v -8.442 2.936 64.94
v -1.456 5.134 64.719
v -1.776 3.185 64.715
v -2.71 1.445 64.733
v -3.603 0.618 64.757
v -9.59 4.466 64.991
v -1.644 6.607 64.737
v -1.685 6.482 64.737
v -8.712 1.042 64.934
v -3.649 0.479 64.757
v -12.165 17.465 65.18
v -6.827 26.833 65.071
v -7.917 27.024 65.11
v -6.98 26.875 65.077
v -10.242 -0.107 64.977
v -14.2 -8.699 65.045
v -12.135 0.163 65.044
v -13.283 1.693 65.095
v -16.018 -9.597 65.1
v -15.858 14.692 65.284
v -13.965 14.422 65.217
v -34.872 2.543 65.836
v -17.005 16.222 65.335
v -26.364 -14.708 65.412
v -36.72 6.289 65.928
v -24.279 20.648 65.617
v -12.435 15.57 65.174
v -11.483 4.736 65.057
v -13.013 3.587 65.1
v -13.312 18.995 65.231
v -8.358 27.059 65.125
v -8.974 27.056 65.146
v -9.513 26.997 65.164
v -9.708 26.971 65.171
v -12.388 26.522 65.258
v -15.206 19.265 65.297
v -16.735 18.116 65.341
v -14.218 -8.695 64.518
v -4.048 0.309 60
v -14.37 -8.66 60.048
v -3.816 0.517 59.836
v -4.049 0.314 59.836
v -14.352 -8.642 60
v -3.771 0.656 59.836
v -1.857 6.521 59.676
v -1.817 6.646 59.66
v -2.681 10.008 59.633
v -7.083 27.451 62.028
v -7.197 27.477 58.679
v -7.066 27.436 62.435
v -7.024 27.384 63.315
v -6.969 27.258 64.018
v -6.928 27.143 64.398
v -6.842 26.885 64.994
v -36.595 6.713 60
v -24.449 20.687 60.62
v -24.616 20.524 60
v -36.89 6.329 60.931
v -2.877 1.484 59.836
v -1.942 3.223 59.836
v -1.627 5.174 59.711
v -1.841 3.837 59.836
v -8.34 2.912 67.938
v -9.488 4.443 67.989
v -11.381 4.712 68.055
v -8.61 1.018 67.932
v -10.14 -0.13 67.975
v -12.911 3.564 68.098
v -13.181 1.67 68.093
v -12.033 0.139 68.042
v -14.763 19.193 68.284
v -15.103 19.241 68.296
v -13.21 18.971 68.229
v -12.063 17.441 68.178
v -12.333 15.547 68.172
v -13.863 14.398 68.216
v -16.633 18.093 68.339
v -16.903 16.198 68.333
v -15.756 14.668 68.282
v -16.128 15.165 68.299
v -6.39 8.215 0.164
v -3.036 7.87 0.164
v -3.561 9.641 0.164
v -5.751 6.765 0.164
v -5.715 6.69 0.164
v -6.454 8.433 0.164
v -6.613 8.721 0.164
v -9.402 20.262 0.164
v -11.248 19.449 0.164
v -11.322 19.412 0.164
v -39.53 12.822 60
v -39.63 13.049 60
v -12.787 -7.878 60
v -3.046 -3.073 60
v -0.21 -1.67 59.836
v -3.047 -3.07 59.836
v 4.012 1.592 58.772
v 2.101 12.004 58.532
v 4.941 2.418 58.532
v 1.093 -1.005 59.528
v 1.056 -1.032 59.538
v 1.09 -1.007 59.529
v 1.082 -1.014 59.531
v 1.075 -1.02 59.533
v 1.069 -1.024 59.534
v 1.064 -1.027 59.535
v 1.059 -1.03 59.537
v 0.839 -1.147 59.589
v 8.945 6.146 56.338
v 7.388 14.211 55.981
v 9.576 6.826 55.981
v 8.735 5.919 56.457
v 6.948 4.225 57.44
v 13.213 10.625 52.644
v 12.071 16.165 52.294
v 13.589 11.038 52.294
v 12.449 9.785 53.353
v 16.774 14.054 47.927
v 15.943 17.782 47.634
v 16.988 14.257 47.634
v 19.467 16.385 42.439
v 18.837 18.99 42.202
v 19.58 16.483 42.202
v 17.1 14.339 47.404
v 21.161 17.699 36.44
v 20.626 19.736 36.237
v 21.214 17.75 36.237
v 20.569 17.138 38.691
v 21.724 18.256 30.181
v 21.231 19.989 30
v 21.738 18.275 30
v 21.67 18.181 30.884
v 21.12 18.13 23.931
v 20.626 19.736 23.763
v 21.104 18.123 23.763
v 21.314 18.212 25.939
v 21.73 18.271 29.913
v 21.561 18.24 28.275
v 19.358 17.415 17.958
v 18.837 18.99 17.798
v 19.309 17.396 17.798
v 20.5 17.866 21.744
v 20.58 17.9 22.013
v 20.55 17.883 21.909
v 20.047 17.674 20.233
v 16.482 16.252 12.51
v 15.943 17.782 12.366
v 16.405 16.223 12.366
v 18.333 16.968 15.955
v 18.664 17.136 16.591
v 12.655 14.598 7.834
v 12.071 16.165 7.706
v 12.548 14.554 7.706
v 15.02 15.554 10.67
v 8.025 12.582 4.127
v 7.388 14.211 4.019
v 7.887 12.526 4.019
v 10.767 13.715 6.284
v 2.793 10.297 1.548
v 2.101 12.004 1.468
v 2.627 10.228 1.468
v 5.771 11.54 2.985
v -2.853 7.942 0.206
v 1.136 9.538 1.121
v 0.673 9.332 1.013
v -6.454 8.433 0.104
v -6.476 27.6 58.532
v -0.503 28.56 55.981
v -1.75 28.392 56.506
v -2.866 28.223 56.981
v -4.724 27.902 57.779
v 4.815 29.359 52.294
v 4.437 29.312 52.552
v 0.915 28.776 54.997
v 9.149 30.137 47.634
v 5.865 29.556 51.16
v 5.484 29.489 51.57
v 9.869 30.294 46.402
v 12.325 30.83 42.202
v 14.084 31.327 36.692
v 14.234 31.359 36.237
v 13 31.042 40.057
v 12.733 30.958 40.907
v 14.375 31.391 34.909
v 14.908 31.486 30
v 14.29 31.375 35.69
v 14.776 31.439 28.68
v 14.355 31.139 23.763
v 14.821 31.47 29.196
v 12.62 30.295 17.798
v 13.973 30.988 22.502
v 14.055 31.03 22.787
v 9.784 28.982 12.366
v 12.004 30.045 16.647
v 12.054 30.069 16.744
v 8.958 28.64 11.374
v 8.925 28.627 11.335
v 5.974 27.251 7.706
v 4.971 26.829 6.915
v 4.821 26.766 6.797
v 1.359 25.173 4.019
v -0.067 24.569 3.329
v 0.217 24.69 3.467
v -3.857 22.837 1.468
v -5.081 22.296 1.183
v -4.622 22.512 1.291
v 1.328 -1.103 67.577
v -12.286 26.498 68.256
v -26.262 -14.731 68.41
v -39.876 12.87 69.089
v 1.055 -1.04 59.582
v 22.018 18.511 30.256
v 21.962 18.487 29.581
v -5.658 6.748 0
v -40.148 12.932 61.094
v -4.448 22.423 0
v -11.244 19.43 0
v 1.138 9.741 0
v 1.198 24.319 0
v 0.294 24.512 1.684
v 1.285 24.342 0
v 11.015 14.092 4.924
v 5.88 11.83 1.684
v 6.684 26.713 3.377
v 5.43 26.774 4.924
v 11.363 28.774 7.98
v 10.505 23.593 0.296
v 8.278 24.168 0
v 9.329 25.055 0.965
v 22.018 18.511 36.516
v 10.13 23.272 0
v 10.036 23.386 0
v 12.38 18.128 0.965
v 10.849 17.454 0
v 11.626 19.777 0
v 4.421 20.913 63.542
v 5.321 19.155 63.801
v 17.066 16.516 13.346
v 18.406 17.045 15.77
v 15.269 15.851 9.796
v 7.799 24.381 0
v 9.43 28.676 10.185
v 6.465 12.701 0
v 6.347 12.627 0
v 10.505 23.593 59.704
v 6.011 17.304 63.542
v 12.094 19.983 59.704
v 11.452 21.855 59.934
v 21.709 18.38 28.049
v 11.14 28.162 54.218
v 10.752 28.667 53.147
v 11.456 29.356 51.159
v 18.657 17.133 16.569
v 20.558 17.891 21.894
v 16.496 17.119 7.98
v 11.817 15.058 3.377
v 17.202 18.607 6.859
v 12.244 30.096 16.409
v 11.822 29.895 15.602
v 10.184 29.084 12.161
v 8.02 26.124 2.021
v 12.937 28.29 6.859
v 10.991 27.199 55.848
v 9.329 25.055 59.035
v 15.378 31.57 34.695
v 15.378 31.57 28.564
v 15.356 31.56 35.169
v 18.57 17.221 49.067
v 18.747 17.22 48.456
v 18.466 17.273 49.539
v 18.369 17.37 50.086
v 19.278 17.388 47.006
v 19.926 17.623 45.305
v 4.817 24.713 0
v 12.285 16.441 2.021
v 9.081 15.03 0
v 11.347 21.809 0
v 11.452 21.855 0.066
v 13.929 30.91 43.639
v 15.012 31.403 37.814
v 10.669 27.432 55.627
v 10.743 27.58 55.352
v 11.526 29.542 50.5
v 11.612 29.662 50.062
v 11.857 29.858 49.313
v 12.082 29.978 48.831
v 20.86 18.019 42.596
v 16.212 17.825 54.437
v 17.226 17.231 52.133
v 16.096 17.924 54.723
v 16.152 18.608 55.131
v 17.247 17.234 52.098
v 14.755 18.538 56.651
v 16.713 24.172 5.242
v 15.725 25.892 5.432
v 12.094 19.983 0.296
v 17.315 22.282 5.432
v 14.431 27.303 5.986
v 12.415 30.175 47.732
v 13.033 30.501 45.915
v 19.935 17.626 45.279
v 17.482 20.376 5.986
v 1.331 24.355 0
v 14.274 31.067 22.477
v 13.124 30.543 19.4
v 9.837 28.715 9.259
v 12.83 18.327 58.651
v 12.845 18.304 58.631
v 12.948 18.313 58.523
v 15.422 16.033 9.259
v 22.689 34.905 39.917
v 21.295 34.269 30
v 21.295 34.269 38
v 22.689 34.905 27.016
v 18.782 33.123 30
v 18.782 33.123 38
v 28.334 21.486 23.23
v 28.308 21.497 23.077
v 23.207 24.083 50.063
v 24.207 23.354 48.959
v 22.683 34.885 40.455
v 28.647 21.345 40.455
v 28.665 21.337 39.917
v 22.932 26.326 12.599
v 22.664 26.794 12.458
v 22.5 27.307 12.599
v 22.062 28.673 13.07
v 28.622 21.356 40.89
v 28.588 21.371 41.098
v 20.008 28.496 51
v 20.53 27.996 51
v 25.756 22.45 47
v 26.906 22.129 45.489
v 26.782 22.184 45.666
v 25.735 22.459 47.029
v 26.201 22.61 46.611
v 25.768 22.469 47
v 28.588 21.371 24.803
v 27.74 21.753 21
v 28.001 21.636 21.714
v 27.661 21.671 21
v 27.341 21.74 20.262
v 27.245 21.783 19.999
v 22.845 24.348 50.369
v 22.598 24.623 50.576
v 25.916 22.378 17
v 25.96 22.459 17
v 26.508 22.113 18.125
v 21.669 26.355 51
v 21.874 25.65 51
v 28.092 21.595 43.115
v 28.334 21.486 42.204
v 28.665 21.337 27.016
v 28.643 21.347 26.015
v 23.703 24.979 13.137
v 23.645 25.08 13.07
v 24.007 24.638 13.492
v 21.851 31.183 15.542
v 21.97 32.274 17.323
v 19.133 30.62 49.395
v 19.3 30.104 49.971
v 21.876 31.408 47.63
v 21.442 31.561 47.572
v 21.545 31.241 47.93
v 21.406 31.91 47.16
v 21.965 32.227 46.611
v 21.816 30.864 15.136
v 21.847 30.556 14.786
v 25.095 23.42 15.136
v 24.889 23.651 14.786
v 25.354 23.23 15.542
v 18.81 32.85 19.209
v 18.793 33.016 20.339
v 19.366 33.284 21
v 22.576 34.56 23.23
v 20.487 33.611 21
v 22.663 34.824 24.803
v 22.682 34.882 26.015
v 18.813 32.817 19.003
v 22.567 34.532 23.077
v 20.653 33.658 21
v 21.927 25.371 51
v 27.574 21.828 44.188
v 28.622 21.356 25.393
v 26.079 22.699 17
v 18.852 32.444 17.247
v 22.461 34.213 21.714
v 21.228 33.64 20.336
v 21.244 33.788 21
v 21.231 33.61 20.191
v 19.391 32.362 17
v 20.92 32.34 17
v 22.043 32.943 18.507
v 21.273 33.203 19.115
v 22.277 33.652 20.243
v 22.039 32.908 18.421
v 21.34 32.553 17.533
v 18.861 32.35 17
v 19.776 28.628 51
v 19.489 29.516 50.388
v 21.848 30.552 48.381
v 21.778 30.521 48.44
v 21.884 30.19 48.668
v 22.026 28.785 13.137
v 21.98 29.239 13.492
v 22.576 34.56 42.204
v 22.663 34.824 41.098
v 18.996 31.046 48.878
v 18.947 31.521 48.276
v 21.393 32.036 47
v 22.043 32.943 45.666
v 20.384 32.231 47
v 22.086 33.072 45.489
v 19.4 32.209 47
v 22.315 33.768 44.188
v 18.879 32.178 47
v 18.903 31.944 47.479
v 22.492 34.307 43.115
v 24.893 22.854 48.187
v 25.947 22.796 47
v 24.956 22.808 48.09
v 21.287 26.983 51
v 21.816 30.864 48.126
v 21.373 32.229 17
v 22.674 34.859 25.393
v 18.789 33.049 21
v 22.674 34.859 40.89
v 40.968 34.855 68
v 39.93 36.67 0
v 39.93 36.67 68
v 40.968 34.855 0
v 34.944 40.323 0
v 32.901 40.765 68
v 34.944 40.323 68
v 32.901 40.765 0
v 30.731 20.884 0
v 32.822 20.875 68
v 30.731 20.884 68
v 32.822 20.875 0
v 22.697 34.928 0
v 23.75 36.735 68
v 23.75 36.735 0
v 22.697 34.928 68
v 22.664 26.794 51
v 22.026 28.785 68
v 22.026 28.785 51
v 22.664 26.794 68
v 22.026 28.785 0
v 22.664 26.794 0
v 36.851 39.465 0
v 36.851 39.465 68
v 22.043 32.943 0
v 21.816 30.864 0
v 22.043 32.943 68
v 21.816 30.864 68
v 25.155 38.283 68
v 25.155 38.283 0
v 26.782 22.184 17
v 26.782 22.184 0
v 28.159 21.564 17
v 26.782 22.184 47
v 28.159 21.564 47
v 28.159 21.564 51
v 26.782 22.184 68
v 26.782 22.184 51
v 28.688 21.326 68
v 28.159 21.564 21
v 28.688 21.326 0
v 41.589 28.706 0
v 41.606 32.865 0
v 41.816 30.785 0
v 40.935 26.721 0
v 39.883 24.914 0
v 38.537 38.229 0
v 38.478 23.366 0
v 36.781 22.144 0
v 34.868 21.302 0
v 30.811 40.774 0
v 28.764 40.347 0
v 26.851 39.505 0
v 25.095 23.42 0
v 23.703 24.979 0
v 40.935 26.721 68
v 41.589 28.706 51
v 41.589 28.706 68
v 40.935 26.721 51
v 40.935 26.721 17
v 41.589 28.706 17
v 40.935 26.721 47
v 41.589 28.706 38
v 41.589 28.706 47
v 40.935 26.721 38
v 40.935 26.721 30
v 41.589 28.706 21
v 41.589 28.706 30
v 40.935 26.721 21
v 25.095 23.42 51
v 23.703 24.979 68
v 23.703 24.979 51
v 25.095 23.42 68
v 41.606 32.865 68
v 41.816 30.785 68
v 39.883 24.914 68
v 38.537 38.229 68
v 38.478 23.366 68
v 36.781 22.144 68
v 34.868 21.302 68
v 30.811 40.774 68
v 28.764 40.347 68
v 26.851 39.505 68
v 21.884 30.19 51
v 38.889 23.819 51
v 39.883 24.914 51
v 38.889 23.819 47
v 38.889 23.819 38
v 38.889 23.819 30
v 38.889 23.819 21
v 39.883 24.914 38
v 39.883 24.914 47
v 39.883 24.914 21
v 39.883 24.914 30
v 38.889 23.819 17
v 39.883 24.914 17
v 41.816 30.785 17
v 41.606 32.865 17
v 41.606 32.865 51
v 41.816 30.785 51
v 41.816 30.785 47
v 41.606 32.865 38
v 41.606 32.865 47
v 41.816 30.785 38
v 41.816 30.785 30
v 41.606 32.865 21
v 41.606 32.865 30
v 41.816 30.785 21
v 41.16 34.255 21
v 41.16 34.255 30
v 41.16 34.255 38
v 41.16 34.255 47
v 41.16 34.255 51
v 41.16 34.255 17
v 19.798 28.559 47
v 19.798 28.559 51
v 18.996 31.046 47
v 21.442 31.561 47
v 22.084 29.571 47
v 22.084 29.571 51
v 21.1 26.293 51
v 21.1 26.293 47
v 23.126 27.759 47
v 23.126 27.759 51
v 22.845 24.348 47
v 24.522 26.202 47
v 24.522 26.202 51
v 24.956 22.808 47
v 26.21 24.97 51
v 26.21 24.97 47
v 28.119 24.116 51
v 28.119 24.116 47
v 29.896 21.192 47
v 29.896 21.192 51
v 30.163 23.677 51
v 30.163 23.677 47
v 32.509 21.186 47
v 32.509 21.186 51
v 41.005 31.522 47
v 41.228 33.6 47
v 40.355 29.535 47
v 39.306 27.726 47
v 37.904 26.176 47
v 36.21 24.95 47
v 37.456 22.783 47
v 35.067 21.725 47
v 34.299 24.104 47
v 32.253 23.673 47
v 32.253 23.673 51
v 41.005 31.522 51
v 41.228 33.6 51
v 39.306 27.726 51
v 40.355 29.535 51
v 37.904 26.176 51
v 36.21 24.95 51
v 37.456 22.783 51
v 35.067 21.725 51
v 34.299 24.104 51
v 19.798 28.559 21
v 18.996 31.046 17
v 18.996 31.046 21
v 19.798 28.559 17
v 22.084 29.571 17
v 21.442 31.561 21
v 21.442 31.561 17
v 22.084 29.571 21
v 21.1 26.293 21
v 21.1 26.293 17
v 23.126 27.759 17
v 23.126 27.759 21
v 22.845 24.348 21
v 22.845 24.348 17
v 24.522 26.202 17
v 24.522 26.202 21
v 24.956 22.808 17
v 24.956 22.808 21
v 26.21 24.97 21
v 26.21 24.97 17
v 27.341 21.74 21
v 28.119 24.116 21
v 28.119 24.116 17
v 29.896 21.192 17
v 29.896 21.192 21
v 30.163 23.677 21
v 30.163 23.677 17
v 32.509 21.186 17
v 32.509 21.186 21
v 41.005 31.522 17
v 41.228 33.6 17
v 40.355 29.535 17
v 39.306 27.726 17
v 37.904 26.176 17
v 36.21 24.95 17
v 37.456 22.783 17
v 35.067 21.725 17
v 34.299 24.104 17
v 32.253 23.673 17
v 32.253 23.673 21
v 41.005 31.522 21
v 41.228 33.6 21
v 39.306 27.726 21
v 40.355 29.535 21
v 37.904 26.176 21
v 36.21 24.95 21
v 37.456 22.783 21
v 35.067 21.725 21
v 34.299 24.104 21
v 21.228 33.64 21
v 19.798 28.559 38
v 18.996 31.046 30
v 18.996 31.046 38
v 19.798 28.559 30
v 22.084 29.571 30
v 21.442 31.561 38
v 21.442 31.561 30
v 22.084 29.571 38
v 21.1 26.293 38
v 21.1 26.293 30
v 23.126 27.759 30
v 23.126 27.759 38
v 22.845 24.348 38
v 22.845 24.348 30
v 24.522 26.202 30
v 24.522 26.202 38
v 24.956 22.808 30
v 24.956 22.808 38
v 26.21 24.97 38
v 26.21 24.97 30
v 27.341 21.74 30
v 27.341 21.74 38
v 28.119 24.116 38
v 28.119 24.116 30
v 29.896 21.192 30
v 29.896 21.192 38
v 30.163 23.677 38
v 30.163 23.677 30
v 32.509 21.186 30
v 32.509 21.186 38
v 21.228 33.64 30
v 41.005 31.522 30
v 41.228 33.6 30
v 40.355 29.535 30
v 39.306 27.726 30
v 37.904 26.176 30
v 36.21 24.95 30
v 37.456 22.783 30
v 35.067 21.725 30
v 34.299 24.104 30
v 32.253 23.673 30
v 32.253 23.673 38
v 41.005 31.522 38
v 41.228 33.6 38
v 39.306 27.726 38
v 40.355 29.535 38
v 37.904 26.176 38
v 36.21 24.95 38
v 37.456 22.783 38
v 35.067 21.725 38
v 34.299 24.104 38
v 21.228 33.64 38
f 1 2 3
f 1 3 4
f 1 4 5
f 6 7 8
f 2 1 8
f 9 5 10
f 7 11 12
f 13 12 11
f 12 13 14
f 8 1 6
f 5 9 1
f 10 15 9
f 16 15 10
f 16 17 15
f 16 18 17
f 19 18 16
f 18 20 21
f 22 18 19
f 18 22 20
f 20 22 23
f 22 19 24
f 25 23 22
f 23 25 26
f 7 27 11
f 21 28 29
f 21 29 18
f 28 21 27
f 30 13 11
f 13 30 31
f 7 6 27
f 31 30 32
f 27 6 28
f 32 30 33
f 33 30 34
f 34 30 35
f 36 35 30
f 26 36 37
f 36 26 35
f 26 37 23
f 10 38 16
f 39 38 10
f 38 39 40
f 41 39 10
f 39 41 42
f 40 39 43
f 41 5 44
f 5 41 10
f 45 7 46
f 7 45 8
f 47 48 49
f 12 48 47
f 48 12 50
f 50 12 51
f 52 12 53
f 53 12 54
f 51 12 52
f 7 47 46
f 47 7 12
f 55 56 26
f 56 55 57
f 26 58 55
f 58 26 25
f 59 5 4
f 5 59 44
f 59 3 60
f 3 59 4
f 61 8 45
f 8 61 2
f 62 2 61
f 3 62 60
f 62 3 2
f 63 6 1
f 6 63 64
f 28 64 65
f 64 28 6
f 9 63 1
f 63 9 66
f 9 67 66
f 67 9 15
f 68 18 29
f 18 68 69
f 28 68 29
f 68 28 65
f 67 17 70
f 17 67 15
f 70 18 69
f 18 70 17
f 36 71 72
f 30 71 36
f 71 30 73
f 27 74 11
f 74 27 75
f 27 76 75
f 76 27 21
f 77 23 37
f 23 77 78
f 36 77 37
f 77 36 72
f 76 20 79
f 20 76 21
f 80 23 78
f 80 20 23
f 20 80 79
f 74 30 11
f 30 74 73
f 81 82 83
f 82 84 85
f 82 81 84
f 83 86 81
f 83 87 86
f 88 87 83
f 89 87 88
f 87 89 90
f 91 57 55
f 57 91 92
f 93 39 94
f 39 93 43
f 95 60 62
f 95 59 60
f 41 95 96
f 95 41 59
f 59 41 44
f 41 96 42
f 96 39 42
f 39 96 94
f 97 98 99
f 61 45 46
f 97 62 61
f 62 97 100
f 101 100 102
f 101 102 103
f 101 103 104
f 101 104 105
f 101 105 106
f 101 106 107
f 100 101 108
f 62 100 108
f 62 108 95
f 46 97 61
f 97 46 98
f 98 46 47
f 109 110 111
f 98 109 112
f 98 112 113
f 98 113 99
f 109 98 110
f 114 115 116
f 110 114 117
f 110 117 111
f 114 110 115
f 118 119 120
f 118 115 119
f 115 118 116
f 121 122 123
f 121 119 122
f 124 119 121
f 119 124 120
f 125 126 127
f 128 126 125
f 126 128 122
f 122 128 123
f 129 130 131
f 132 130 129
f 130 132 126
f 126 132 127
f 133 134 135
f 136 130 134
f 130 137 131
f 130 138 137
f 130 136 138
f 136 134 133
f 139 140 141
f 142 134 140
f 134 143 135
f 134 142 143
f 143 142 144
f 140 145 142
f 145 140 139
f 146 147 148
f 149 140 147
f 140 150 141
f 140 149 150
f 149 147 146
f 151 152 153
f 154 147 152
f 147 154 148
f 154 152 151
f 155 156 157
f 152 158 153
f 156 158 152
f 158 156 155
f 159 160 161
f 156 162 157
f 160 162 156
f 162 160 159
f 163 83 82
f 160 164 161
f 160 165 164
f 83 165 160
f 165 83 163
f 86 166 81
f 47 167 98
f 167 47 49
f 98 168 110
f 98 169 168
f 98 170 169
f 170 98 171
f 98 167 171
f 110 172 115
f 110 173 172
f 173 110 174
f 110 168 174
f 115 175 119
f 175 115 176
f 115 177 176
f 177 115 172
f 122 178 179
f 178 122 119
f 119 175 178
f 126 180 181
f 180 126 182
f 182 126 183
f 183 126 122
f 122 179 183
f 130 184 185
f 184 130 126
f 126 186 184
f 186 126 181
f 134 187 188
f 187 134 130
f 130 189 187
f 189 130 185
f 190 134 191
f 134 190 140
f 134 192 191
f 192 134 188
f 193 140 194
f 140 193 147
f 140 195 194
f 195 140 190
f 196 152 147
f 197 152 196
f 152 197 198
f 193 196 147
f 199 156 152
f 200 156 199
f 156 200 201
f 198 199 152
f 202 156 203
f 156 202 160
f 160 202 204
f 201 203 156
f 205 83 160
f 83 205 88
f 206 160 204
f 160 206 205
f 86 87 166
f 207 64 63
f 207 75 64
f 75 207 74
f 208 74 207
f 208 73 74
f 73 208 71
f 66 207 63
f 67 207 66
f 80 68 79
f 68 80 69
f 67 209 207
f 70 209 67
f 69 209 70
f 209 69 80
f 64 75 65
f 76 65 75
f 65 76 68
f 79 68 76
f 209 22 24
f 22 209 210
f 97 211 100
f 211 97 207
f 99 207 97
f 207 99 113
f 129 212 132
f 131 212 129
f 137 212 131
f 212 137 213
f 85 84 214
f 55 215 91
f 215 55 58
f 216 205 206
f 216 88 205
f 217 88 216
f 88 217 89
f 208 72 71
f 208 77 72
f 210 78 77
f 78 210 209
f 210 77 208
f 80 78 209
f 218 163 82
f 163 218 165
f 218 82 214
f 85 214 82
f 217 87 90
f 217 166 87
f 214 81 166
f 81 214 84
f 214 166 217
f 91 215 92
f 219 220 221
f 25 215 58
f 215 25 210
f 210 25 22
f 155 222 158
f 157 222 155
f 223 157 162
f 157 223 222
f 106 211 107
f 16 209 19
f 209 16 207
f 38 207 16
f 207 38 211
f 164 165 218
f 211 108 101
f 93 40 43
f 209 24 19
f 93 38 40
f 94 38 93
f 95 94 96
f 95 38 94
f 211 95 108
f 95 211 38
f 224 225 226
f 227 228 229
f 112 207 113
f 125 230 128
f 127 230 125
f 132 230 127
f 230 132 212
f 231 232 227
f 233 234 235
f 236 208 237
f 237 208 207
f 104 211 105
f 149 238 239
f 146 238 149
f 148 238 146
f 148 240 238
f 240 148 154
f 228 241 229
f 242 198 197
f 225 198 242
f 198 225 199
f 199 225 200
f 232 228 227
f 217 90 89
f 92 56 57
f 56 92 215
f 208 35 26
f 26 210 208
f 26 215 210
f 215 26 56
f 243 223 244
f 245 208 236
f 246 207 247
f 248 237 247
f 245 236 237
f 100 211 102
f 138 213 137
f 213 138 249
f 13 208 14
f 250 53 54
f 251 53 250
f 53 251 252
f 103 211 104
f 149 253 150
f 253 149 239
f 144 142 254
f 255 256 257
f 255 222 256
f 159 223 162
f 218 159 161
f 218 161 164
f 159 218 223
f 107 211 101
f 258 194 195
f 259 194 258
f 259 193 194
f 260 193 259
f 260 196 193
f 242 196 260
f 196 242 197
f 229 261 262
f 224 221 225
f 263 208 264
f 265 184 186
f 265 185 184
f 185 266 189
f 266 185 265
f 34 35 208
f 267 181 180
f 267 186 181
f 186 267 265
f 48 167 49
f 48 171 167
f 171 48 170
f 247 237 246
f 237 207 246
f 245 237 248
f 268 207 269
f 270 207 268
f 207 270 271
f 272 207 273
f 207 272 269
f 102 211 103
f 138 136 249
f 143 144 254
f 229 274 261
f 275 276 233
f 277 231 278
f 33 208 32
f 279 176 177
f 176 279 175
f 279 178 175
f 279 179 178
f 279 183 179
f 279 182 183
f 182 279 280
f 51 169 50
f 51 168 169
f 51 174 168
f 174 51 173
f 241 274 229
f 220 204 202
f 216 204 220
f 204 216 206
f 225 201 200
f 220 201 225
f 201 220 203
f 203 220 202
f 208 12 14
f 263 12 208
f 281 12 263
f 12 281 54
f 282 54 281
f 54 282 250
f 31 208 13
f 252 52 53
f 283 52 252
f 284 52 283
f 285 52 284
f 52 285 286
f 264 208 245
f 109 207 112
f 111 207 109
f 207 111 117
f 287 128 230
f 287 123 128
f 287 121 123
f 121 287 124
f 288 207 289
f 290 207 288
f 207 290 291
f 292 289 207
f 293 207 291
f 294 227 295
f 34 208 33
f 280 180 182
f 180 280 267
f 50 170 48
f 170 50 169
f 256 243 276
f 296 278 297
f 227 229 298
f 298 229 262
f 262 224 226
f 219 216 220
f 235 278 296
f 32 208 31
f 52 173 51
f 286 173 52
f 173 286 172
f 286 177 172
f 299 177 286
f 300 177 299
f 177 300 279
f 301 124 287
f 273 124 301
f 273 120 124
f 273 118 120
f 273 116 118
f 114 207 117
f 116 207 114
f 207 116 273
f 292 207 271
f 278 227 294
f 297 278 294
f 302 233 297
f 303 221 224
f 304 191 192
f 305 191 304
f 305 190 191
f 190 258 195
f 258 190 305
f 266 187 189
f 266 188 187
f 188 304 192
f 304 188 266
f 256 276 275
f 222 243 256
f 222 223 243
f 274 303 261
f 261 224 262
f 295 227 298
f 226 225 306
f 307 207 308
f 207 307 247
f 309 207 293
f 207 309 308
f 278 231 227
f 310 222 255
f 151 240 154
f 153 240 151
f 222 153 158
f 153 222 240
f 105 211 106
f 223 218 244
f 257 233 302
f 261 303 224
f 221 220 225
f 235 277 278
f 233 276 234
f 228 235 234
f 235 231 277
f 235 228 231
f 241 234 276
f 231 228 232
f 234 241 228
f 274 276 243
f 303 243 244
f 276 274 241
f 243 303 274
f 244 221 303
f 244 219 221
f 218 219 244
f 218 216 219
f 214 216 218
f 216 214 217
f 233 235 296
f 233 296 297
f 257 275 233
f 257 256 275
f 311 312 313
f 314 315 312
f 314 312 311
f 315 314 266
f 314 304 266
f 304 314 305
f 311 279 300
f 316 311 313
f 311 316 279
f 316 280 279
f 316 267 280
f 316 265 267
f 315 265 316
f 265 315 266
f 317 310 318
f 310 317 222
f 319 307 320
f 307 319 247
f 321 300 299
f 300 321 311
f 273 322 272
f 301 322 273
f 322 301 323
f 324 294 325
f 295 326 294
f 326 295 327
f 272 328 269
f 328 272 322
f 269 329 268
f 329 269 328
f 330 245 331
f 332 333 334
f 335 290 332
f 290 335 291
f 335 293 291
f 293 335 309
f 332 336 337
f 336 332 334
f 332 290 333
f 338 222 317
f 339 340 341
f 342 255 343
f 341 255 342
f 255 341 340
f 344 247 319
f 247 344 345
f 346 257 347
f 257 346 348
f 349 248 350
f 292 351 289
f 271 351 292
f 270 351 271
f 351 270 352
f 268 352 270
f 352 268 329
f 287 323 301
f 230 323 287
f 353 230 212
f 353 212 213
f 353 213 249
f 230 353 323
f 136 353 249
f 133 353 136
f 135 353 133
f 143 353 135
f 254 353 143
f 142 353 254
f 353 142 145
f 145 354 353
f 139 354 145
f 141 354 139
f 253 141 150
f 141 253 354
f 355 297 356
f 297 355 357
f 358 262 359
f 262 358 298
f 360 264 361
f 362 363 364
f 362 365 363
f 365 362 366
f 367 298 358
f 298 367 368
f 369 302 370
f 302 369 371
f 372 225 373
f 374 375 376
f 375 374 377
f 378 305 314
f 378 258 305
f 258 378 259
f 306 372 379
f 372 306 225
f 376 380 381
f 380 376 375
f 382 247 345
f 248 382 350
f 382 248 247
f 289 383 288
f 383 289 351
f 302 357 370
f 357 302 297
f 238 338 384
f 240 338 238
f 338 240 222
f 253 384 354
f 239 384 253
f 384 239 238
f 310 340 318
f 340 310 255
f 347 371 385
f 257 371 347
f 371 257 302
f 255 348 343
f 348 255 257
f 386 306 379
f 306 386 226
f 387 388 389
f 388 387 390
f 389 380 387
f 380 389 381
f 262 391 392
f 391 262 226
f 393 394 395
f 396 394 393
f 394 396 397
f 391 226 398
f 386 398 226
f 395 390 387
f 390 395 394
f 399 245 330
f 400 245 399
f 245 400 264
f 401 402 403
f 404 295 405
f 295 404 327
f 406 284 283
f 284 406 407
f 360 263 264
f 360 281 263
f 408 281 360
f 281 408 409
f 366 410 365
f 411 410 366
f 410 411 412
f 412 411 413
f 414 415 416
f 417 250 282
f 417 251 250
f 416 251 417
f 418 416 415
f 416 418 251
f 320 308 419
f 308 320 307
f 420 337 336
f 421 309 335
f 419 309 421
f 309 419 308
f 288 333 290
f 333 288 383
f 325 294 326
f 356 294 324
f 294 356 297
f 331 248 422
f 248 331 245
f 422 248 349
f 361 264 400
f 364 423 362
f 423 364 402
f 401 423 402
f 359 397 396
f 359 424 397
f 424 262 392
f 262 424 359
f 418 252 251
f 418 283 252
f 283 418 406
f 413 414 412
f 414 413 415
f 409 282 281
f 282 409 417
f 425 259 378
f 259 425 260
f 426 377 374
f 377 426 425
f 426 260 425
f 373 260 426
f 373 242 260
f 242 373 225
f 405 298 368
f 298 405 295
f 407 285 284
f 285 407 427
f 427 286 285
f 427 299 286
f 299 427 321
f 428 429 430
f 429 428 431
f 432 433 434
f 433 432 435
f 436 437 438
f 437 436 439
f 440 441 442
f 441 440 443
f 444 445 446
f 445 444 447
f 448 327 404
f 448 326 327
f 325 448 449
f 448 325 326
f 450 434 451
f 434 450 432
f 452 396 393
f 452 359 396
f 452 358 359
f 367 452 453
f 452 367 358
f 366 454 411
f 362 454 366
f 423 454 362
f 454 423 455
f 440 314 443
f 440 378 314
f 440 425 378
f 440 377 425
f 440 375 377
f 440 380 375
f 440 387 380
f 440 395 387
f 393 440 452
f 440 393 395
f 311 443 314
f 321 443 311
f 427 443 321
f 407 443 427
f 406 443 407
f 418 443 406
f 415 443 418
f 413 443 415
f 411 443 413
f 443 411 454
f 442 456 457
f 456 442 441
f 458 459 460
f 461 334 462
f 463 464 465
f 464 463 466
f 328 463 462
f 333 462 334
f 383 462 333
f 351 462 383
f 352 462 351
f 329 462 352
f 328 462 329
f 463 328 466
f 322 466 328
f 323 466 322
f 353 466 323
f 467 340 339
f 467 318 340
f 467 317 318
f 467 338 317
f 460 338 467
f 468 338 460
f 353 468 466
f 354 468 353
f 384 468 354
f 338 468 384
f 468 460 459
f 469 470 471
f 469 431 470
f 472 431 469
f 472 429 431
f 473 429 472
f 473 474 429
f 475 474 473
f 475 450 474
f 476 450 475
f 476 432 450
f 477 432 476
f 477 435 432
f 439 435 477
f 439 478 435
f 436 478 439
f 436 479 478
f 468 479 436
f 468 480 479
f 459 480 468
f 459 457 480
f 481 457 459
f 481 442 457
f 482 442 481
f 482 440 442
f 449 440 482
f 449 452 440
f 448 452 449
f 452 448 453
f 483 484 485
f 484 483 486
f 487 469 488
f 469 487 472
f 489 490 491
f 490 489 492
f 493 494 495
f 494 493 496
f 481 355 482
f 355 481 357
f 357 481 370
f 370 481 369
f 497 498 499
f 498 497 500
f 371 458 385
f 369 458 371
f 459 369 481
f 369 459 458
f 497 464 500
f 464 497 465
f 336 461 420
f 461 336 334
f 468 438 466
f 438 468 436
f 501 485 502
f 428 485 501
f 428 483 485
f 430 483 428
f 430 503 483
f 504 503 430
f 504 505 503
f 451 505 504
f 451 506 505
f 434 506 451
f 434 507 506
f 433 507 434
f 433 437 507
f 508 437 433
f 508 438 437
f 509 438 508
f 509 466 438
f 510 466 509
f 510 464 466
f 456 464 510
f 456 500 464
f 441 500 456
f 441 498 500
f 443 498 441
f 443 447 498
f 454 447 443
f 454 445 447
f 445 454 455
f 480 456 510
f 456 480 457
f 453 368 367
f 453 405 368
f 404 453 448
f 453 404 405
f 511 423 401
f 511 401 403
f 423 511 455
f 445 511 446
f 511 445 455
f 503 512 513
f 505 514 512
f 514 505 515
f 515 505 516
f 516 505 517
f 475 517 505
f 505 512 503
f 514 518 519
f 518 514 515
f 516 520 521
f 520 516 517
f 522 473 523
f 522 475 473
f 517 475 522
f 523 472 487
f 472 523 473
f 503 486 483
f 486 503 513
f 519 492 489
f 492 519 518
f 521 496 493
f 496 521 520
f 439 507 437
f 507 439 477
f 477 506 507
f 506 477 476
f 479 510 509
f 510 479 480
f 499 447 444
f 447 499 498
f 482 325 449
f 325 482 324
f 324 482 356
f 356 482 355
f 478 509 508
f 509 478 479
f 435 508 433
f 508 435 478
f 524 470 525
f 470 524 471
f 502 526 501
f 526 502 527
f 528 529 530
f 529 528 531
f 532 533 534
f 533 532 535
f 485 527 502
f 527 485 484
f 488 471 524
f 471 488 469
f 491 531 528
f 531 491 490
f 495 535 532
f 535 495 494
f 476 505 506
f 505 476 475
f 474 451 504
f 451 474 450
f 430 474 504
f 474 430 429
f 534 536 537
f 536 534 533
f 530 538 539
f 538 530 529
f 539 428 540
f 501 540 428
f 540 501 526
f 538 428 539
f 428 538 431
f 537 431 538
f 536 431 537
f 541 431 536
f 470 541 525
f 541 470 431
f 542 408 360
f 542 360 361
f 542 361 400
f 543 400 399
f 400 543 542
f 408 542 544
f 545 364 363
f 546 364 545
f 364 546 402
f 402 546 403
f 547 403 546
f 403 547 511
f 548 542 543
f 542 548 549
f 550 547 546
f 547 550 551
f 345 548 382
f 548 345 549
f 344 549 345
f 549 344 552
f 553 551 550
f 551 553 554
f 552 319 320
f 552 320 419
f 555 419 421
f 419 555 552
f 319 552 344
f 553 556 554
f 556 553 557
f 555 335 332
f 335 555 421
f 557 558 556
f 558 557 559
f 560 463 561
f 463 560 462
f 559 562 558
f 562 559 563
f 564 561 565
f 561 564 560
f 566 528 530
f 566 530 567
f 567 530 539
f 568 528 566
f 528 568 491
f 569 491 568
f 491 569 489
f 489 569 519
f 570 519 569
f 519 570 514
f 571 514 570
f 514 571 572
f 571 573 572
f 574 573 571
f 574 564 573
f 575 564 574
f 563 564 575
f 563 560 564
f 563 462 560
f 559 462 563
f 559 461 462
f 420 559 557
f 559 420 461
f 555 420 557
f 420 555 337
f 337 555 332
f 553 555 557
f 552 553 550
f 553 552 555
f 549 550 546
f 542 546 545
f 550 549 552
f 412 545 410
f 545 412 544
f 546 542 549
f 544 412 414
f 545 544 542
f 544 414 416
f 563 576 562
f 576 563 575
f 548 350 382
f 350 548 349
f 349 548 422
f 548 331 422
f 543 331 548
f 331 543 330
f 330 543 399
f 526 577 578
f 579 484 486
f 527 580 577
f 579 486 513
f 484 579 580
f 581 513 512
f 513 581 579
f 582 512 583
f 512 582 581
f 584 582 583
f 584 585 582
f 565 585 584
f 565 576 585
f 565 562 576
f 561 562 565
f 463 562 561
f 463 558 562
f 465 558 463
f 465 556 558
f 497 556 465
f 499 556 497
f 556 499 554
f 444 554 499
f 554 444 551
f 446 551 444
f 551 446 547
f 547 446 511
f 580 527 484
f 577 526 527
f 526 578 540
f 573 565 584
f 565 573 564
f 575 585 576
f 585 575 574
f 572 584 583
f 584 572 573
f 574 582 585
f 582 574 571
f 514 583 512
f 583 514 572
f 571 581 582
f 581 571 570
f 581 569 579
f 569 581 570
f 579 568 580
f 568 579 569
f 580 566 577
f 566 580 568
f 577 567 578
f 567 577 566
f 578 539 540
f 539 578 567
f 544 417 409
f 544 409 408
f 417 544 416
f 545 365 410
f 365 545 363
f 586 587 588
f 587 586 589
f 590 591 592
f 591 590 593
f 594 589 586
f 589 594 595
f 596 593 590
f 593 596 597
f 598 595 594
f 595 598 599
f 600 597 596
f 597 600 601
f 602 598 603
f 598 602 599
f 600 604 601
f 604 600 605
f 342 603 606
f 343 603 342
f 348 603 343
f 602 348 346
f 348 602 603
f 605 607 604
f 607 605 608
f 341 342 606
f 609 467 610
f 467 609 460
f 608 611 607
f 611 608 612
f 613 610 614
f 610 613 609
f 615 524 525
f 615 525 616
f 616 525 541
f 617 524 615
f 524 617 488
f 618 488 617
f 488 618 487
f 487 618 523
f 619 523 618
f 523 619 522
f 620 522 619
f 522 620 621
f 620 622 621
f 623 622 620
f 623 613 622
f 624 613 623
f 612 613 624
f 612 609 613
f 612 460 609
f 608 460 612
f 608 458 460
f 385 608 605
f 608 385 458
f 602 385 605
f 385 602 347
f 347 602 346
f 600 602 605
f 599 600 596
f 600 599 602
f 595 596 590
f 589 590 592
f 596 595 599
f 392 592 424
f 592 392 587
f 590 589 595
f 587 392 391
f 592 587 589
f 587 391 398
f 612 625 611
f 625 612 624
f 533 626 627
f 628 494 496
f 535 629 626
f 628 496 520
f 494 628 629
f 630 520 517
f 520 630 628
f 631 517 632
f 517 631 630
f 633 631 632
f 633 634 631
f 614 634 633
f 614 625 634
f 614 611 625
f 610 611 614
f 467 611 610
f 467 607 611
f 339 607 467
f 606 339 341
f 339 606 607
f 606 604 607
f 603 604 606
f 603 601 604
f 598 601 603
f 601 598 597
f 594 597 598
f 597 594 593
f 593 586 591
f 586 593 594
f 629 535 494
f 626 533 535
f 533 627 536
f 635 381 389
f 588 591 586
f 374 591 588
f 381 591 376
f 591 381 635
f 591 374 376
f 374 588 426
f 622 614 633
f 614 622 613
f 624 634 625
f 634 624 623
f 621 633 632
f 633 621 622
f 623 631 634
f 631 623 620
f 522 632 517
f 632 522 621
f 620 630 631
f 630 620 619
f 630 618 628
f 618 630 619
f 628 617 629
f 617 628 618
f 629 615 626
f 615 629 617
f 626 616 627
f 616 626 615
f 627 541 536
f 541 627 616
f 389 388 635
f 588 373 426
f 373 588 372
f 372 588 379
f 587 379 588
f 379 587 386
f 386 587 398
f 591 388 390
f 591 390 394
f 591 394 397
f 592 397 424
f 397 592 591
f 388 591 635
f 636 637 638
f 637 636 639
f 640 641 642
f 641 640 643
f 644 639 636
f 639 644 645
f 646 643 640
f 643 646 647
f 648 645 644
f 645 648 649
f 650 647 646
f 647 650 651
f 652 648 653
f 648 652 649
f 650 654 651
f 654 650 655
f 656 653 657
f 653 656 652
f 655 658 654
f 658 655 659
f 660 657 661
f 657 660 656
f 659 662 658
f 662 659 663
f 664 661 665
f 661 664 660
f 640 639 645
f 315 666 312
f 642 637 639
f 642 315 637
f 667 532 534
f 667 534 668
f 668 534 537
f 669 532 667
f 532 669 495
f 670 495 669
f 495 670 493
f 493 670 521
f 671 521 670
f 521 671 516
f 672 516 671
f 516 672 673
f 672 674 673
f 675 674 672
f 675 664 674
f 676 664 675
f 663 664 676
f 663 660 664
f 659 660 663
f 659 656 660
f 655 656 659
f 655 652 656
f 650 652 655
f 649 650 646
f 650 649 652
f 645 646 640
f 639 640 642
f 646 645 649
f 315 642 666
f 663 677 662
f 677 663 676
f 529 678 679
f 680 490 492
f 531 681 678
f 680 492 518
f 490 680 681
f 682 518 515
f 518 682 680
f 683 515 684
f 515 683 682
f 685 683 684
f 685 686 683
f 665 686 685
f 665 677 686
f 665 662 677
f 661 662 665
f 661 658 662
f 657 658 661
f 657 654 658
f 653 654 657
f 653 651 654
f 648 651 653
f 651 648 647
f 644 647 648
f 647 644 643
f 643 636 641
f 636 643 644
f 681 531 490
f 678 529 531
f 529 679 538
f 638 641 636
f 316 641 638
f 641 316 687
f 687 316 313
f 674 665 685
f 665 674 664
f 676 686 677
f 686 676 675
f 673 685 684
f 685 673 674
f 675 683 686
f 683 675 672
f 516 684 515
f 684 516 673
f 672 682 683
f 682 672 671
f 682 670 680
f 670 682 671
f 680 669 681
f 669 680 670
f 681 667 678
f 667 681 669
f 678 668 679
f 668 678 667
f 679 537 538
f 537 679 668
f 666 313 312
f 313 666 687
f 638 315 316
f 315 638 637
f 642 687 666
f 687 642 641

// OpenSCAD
// file: bezier.scad
// bezier_deltat determines the stepsize of the 'running variable' t below.
// The smaller the step the smoother the curve.
// Since the default of $fn is zero we the min below makes sure that
// the functions below remain working if $fn is not set explicitly.
bezier_deltat = min(0.1,1/$fn);

// Quadratic Bezier formula
// B(t)=(1-t)(1-t)p0+2(1-t)(t)p1+(t)(t)p2
// Would be possible w/o concat since OpenSCAD 2019.05
function bezier(p0,p1,p2) = concat([for (t=[0:bezier_deltat:1]) pow(1-t,2)*p0+2*(1-t)*t*p1+pow(t,2)*p2],[p2]);
// file: utils.scad
// https://stackoverflow.com/a/45826244/1905491
// rotate as per a, v, but around point pt
module rotate_about_pt(a, v, pt) {
    translate(pt)
        rotate(a,v)
            translate(-pt)
                children();   
}
// file: mud_common.scad
// overridable global functions/variables
function is_holder_front_facing() = 0;
function is_high_infill_only()=0;

mud_screw_head_h_extra=5; // Make sunk screws in bracket (if mud_strut_rotation_edge is >~3°)
function mud_screw_off_y()=2*holder_wall-mud_strut_thick;
function holder_rect_height()=holder_rect_width;
function holder_bracket_off_r()=0;

////////////////////////////////////////////////////////////////////////
// Holder common
holder_wall = 4;
tie_w_center=8;
tie_w=4;
tie_h=2.5;
tie_gap=15;

// Holder beam
holder_beam_d = 20;
holder_beam_inwards_off = 2*holder_wall;
holder_beam_h = mud_d+holder_beam_inwards_off;

// Holder arc
mud_strut_extra_thick=10;
holder_arc_width = 14;
w = tan(holder_arc_angle_quirk)*mud_strut_screw_r;
x = holder_arc_width/2;
y = cos(holder_arc_angle()-45)*mud_strut_back_hole_dist;
holder_rect_width = 2*w + 2*x + y;

module holder_rotation(orbit) {
  rotate_about_pt(holder_arc_angle(),[0,1,0],[mud_axle_x,0,-mud_axle_z]) // Rotate to final location
    translate([-orbit, 0, 0]) // Move to correct "orbit"
      translate([mud_axle_x,0,-mud_axle_z]) // Move to axle
        children();
}

module holder_arc () {
  arc_extent_angle=180;
  holder_rotation(mud_axle_r-mud_d/2)
    intersection() { // Prevent bleeding on the outer side
      translate([0, -mud_d/2+holder_arc_width/2,0])
        cube([mud_d+holder_arc_width, mud_d+holder_arc_width,holder_arc_width],true);

      translate([0, -mud_d/2, -holder_arc_width/2]) // Move arc to correct y location and z-center on origin
        rotate([0,0,270-arc_extent_angle,]) // Fix coordinate system
            rotate_extrude(angle = arc_extent_angle, convexity = 10) // Create arc_extent_angle° arc
              translate([mud_d/2, holder_arc_width/2, 0]) // Move half-circle to arc's "orbit"
                union() {
                  intersection() { // Create half-circle
                    translate([holder_arc_width/2,0,0])
                      square([holder_arc_width, holder_arc_width],center=true);
                    circle(d=holder_arc_width);
                  }
                }
    }
}

module holder_bracket () {
  holder_rotation(mud_strut_screw_r)
    translate([holder_bracket_off_r(), 0, 0]) // 
      translate([0, 0, holder_arc_width/2]) // Offset to match the arcs front facing border (later)
        translate([-holder_rect_height(), 0, -holder_rect_width]) // Move corner to origin
          cube([holder_rect_height(), 2*holder_wall, holder_rect_width]);
}

module tie_channel (h=tie_h, w=tie_w, off_h=0) {
  translate([0, +w/2-off_h, 0]) // Center
    holder_beam_translation()
      rotate([0,-holder_arc_angle()+(is_holder_front_facing()?180:0),0])
        translate([-holder_beam_d/7, 0, 0]) // Nudge into the beam
          rotate([180,90,90]) // Fix coordinate system
            rotate_extrude(angle = 360, convexity = 2) 
              translate([holder_beam_d/2, 0, 0]) // Move to "orbit"
                square([h, w]);
}

module holder_beam_translation() {
  holder_rotation(mud_axle_r+holder_beam_d/2+holder_wall)
    translate([0, -holder_beam_h/2+holder_beam_inwards_off, 0]) // Move to correct y location
      children();
}

module tie_channels (h=tie_h, w=tie_w, gap_percent=200) {
  tie_channel(h=tie_h, w=tie_w_center);
  for (o=[-tie_gap, tie_gap]) {
    tie_channel(h=tie_h, w=tie_w, off_h=o);
  }
}

module holder_beam (h, d) {
  holder_beam_translation()
    rotate([90,0,0]) // Fix coordinate system
      cylinder(d=d, h=h, center=true);
}

module holder () {
  difference () {
    union() {
      hull() {
        strut_rotation()
          holder_bracket();
        holder_arc();
      }
      hull() {
        holder_arc();
        holder_beam(holder_beam_h/16, holder_beam_d*3/4);
      }
      holder_beam(holder_beam_h, holder_beam_d);
    }
    tie_channels();
  }
}

module high_infill_screws (off=0) {
  mud_strut_holes(d=4*mud_strut_hole_d, h_add=mud_screw_off_y());
}

module translate_result_base() {
  if (outer_is_base && !is_high_infill_only()) {
    translate([0, 0, holder_beam_h])
      rotate([+90,0,holder_arc_angle()])
        children();
  } else {
    rotate([-90,0,holder_arc_angle()])
      strut_rotation(1)
        children();
  }
}

module translate_result() {
  translate_result_base()
    translate([result_x_off, -2*holder_wall, result_z_off])
        children();
}

module translate_bike() {
  translate_result() children();
}

module norm_infill () {
  difference() {
    translate_result()
      holder();
    bike();
  }
}

module high_infill () {
  intersection() {
    norm_infill();
    translate_result() {
      rotate([0, mud_strut_rotation_y, 0])
        high_infill_screws();
    }
  }
}
// main file
// $fn=20;
// $fn=50;
// $fn=200;

// is_left = 1;
// is_high_infill = 1;

outer_is_base=1;

include <common.scad>;

holder_arc_angle_quirk=1;
holder_arc_off_x=mud_strut_front_off_x-mud_axle_x+mud_strut_front_corner_dist/2;
holder_arc_off_z=mud_strut_front_off_z+mud_axle_z;
function holder_arc_angle() = 180-atan(((holder_arc_off_z/holder_arc_off_x)))+holder_arc_angle_quirk;

result_x_off=-mud_strut_front_off_x;
result_z_off=-mud_strut_front_off_z;

include <mud_common.scad>;

function holder_bracket_off_r()=5;
function is_holder_front_facing()=1;
// function is_high_infill_only()=1;
